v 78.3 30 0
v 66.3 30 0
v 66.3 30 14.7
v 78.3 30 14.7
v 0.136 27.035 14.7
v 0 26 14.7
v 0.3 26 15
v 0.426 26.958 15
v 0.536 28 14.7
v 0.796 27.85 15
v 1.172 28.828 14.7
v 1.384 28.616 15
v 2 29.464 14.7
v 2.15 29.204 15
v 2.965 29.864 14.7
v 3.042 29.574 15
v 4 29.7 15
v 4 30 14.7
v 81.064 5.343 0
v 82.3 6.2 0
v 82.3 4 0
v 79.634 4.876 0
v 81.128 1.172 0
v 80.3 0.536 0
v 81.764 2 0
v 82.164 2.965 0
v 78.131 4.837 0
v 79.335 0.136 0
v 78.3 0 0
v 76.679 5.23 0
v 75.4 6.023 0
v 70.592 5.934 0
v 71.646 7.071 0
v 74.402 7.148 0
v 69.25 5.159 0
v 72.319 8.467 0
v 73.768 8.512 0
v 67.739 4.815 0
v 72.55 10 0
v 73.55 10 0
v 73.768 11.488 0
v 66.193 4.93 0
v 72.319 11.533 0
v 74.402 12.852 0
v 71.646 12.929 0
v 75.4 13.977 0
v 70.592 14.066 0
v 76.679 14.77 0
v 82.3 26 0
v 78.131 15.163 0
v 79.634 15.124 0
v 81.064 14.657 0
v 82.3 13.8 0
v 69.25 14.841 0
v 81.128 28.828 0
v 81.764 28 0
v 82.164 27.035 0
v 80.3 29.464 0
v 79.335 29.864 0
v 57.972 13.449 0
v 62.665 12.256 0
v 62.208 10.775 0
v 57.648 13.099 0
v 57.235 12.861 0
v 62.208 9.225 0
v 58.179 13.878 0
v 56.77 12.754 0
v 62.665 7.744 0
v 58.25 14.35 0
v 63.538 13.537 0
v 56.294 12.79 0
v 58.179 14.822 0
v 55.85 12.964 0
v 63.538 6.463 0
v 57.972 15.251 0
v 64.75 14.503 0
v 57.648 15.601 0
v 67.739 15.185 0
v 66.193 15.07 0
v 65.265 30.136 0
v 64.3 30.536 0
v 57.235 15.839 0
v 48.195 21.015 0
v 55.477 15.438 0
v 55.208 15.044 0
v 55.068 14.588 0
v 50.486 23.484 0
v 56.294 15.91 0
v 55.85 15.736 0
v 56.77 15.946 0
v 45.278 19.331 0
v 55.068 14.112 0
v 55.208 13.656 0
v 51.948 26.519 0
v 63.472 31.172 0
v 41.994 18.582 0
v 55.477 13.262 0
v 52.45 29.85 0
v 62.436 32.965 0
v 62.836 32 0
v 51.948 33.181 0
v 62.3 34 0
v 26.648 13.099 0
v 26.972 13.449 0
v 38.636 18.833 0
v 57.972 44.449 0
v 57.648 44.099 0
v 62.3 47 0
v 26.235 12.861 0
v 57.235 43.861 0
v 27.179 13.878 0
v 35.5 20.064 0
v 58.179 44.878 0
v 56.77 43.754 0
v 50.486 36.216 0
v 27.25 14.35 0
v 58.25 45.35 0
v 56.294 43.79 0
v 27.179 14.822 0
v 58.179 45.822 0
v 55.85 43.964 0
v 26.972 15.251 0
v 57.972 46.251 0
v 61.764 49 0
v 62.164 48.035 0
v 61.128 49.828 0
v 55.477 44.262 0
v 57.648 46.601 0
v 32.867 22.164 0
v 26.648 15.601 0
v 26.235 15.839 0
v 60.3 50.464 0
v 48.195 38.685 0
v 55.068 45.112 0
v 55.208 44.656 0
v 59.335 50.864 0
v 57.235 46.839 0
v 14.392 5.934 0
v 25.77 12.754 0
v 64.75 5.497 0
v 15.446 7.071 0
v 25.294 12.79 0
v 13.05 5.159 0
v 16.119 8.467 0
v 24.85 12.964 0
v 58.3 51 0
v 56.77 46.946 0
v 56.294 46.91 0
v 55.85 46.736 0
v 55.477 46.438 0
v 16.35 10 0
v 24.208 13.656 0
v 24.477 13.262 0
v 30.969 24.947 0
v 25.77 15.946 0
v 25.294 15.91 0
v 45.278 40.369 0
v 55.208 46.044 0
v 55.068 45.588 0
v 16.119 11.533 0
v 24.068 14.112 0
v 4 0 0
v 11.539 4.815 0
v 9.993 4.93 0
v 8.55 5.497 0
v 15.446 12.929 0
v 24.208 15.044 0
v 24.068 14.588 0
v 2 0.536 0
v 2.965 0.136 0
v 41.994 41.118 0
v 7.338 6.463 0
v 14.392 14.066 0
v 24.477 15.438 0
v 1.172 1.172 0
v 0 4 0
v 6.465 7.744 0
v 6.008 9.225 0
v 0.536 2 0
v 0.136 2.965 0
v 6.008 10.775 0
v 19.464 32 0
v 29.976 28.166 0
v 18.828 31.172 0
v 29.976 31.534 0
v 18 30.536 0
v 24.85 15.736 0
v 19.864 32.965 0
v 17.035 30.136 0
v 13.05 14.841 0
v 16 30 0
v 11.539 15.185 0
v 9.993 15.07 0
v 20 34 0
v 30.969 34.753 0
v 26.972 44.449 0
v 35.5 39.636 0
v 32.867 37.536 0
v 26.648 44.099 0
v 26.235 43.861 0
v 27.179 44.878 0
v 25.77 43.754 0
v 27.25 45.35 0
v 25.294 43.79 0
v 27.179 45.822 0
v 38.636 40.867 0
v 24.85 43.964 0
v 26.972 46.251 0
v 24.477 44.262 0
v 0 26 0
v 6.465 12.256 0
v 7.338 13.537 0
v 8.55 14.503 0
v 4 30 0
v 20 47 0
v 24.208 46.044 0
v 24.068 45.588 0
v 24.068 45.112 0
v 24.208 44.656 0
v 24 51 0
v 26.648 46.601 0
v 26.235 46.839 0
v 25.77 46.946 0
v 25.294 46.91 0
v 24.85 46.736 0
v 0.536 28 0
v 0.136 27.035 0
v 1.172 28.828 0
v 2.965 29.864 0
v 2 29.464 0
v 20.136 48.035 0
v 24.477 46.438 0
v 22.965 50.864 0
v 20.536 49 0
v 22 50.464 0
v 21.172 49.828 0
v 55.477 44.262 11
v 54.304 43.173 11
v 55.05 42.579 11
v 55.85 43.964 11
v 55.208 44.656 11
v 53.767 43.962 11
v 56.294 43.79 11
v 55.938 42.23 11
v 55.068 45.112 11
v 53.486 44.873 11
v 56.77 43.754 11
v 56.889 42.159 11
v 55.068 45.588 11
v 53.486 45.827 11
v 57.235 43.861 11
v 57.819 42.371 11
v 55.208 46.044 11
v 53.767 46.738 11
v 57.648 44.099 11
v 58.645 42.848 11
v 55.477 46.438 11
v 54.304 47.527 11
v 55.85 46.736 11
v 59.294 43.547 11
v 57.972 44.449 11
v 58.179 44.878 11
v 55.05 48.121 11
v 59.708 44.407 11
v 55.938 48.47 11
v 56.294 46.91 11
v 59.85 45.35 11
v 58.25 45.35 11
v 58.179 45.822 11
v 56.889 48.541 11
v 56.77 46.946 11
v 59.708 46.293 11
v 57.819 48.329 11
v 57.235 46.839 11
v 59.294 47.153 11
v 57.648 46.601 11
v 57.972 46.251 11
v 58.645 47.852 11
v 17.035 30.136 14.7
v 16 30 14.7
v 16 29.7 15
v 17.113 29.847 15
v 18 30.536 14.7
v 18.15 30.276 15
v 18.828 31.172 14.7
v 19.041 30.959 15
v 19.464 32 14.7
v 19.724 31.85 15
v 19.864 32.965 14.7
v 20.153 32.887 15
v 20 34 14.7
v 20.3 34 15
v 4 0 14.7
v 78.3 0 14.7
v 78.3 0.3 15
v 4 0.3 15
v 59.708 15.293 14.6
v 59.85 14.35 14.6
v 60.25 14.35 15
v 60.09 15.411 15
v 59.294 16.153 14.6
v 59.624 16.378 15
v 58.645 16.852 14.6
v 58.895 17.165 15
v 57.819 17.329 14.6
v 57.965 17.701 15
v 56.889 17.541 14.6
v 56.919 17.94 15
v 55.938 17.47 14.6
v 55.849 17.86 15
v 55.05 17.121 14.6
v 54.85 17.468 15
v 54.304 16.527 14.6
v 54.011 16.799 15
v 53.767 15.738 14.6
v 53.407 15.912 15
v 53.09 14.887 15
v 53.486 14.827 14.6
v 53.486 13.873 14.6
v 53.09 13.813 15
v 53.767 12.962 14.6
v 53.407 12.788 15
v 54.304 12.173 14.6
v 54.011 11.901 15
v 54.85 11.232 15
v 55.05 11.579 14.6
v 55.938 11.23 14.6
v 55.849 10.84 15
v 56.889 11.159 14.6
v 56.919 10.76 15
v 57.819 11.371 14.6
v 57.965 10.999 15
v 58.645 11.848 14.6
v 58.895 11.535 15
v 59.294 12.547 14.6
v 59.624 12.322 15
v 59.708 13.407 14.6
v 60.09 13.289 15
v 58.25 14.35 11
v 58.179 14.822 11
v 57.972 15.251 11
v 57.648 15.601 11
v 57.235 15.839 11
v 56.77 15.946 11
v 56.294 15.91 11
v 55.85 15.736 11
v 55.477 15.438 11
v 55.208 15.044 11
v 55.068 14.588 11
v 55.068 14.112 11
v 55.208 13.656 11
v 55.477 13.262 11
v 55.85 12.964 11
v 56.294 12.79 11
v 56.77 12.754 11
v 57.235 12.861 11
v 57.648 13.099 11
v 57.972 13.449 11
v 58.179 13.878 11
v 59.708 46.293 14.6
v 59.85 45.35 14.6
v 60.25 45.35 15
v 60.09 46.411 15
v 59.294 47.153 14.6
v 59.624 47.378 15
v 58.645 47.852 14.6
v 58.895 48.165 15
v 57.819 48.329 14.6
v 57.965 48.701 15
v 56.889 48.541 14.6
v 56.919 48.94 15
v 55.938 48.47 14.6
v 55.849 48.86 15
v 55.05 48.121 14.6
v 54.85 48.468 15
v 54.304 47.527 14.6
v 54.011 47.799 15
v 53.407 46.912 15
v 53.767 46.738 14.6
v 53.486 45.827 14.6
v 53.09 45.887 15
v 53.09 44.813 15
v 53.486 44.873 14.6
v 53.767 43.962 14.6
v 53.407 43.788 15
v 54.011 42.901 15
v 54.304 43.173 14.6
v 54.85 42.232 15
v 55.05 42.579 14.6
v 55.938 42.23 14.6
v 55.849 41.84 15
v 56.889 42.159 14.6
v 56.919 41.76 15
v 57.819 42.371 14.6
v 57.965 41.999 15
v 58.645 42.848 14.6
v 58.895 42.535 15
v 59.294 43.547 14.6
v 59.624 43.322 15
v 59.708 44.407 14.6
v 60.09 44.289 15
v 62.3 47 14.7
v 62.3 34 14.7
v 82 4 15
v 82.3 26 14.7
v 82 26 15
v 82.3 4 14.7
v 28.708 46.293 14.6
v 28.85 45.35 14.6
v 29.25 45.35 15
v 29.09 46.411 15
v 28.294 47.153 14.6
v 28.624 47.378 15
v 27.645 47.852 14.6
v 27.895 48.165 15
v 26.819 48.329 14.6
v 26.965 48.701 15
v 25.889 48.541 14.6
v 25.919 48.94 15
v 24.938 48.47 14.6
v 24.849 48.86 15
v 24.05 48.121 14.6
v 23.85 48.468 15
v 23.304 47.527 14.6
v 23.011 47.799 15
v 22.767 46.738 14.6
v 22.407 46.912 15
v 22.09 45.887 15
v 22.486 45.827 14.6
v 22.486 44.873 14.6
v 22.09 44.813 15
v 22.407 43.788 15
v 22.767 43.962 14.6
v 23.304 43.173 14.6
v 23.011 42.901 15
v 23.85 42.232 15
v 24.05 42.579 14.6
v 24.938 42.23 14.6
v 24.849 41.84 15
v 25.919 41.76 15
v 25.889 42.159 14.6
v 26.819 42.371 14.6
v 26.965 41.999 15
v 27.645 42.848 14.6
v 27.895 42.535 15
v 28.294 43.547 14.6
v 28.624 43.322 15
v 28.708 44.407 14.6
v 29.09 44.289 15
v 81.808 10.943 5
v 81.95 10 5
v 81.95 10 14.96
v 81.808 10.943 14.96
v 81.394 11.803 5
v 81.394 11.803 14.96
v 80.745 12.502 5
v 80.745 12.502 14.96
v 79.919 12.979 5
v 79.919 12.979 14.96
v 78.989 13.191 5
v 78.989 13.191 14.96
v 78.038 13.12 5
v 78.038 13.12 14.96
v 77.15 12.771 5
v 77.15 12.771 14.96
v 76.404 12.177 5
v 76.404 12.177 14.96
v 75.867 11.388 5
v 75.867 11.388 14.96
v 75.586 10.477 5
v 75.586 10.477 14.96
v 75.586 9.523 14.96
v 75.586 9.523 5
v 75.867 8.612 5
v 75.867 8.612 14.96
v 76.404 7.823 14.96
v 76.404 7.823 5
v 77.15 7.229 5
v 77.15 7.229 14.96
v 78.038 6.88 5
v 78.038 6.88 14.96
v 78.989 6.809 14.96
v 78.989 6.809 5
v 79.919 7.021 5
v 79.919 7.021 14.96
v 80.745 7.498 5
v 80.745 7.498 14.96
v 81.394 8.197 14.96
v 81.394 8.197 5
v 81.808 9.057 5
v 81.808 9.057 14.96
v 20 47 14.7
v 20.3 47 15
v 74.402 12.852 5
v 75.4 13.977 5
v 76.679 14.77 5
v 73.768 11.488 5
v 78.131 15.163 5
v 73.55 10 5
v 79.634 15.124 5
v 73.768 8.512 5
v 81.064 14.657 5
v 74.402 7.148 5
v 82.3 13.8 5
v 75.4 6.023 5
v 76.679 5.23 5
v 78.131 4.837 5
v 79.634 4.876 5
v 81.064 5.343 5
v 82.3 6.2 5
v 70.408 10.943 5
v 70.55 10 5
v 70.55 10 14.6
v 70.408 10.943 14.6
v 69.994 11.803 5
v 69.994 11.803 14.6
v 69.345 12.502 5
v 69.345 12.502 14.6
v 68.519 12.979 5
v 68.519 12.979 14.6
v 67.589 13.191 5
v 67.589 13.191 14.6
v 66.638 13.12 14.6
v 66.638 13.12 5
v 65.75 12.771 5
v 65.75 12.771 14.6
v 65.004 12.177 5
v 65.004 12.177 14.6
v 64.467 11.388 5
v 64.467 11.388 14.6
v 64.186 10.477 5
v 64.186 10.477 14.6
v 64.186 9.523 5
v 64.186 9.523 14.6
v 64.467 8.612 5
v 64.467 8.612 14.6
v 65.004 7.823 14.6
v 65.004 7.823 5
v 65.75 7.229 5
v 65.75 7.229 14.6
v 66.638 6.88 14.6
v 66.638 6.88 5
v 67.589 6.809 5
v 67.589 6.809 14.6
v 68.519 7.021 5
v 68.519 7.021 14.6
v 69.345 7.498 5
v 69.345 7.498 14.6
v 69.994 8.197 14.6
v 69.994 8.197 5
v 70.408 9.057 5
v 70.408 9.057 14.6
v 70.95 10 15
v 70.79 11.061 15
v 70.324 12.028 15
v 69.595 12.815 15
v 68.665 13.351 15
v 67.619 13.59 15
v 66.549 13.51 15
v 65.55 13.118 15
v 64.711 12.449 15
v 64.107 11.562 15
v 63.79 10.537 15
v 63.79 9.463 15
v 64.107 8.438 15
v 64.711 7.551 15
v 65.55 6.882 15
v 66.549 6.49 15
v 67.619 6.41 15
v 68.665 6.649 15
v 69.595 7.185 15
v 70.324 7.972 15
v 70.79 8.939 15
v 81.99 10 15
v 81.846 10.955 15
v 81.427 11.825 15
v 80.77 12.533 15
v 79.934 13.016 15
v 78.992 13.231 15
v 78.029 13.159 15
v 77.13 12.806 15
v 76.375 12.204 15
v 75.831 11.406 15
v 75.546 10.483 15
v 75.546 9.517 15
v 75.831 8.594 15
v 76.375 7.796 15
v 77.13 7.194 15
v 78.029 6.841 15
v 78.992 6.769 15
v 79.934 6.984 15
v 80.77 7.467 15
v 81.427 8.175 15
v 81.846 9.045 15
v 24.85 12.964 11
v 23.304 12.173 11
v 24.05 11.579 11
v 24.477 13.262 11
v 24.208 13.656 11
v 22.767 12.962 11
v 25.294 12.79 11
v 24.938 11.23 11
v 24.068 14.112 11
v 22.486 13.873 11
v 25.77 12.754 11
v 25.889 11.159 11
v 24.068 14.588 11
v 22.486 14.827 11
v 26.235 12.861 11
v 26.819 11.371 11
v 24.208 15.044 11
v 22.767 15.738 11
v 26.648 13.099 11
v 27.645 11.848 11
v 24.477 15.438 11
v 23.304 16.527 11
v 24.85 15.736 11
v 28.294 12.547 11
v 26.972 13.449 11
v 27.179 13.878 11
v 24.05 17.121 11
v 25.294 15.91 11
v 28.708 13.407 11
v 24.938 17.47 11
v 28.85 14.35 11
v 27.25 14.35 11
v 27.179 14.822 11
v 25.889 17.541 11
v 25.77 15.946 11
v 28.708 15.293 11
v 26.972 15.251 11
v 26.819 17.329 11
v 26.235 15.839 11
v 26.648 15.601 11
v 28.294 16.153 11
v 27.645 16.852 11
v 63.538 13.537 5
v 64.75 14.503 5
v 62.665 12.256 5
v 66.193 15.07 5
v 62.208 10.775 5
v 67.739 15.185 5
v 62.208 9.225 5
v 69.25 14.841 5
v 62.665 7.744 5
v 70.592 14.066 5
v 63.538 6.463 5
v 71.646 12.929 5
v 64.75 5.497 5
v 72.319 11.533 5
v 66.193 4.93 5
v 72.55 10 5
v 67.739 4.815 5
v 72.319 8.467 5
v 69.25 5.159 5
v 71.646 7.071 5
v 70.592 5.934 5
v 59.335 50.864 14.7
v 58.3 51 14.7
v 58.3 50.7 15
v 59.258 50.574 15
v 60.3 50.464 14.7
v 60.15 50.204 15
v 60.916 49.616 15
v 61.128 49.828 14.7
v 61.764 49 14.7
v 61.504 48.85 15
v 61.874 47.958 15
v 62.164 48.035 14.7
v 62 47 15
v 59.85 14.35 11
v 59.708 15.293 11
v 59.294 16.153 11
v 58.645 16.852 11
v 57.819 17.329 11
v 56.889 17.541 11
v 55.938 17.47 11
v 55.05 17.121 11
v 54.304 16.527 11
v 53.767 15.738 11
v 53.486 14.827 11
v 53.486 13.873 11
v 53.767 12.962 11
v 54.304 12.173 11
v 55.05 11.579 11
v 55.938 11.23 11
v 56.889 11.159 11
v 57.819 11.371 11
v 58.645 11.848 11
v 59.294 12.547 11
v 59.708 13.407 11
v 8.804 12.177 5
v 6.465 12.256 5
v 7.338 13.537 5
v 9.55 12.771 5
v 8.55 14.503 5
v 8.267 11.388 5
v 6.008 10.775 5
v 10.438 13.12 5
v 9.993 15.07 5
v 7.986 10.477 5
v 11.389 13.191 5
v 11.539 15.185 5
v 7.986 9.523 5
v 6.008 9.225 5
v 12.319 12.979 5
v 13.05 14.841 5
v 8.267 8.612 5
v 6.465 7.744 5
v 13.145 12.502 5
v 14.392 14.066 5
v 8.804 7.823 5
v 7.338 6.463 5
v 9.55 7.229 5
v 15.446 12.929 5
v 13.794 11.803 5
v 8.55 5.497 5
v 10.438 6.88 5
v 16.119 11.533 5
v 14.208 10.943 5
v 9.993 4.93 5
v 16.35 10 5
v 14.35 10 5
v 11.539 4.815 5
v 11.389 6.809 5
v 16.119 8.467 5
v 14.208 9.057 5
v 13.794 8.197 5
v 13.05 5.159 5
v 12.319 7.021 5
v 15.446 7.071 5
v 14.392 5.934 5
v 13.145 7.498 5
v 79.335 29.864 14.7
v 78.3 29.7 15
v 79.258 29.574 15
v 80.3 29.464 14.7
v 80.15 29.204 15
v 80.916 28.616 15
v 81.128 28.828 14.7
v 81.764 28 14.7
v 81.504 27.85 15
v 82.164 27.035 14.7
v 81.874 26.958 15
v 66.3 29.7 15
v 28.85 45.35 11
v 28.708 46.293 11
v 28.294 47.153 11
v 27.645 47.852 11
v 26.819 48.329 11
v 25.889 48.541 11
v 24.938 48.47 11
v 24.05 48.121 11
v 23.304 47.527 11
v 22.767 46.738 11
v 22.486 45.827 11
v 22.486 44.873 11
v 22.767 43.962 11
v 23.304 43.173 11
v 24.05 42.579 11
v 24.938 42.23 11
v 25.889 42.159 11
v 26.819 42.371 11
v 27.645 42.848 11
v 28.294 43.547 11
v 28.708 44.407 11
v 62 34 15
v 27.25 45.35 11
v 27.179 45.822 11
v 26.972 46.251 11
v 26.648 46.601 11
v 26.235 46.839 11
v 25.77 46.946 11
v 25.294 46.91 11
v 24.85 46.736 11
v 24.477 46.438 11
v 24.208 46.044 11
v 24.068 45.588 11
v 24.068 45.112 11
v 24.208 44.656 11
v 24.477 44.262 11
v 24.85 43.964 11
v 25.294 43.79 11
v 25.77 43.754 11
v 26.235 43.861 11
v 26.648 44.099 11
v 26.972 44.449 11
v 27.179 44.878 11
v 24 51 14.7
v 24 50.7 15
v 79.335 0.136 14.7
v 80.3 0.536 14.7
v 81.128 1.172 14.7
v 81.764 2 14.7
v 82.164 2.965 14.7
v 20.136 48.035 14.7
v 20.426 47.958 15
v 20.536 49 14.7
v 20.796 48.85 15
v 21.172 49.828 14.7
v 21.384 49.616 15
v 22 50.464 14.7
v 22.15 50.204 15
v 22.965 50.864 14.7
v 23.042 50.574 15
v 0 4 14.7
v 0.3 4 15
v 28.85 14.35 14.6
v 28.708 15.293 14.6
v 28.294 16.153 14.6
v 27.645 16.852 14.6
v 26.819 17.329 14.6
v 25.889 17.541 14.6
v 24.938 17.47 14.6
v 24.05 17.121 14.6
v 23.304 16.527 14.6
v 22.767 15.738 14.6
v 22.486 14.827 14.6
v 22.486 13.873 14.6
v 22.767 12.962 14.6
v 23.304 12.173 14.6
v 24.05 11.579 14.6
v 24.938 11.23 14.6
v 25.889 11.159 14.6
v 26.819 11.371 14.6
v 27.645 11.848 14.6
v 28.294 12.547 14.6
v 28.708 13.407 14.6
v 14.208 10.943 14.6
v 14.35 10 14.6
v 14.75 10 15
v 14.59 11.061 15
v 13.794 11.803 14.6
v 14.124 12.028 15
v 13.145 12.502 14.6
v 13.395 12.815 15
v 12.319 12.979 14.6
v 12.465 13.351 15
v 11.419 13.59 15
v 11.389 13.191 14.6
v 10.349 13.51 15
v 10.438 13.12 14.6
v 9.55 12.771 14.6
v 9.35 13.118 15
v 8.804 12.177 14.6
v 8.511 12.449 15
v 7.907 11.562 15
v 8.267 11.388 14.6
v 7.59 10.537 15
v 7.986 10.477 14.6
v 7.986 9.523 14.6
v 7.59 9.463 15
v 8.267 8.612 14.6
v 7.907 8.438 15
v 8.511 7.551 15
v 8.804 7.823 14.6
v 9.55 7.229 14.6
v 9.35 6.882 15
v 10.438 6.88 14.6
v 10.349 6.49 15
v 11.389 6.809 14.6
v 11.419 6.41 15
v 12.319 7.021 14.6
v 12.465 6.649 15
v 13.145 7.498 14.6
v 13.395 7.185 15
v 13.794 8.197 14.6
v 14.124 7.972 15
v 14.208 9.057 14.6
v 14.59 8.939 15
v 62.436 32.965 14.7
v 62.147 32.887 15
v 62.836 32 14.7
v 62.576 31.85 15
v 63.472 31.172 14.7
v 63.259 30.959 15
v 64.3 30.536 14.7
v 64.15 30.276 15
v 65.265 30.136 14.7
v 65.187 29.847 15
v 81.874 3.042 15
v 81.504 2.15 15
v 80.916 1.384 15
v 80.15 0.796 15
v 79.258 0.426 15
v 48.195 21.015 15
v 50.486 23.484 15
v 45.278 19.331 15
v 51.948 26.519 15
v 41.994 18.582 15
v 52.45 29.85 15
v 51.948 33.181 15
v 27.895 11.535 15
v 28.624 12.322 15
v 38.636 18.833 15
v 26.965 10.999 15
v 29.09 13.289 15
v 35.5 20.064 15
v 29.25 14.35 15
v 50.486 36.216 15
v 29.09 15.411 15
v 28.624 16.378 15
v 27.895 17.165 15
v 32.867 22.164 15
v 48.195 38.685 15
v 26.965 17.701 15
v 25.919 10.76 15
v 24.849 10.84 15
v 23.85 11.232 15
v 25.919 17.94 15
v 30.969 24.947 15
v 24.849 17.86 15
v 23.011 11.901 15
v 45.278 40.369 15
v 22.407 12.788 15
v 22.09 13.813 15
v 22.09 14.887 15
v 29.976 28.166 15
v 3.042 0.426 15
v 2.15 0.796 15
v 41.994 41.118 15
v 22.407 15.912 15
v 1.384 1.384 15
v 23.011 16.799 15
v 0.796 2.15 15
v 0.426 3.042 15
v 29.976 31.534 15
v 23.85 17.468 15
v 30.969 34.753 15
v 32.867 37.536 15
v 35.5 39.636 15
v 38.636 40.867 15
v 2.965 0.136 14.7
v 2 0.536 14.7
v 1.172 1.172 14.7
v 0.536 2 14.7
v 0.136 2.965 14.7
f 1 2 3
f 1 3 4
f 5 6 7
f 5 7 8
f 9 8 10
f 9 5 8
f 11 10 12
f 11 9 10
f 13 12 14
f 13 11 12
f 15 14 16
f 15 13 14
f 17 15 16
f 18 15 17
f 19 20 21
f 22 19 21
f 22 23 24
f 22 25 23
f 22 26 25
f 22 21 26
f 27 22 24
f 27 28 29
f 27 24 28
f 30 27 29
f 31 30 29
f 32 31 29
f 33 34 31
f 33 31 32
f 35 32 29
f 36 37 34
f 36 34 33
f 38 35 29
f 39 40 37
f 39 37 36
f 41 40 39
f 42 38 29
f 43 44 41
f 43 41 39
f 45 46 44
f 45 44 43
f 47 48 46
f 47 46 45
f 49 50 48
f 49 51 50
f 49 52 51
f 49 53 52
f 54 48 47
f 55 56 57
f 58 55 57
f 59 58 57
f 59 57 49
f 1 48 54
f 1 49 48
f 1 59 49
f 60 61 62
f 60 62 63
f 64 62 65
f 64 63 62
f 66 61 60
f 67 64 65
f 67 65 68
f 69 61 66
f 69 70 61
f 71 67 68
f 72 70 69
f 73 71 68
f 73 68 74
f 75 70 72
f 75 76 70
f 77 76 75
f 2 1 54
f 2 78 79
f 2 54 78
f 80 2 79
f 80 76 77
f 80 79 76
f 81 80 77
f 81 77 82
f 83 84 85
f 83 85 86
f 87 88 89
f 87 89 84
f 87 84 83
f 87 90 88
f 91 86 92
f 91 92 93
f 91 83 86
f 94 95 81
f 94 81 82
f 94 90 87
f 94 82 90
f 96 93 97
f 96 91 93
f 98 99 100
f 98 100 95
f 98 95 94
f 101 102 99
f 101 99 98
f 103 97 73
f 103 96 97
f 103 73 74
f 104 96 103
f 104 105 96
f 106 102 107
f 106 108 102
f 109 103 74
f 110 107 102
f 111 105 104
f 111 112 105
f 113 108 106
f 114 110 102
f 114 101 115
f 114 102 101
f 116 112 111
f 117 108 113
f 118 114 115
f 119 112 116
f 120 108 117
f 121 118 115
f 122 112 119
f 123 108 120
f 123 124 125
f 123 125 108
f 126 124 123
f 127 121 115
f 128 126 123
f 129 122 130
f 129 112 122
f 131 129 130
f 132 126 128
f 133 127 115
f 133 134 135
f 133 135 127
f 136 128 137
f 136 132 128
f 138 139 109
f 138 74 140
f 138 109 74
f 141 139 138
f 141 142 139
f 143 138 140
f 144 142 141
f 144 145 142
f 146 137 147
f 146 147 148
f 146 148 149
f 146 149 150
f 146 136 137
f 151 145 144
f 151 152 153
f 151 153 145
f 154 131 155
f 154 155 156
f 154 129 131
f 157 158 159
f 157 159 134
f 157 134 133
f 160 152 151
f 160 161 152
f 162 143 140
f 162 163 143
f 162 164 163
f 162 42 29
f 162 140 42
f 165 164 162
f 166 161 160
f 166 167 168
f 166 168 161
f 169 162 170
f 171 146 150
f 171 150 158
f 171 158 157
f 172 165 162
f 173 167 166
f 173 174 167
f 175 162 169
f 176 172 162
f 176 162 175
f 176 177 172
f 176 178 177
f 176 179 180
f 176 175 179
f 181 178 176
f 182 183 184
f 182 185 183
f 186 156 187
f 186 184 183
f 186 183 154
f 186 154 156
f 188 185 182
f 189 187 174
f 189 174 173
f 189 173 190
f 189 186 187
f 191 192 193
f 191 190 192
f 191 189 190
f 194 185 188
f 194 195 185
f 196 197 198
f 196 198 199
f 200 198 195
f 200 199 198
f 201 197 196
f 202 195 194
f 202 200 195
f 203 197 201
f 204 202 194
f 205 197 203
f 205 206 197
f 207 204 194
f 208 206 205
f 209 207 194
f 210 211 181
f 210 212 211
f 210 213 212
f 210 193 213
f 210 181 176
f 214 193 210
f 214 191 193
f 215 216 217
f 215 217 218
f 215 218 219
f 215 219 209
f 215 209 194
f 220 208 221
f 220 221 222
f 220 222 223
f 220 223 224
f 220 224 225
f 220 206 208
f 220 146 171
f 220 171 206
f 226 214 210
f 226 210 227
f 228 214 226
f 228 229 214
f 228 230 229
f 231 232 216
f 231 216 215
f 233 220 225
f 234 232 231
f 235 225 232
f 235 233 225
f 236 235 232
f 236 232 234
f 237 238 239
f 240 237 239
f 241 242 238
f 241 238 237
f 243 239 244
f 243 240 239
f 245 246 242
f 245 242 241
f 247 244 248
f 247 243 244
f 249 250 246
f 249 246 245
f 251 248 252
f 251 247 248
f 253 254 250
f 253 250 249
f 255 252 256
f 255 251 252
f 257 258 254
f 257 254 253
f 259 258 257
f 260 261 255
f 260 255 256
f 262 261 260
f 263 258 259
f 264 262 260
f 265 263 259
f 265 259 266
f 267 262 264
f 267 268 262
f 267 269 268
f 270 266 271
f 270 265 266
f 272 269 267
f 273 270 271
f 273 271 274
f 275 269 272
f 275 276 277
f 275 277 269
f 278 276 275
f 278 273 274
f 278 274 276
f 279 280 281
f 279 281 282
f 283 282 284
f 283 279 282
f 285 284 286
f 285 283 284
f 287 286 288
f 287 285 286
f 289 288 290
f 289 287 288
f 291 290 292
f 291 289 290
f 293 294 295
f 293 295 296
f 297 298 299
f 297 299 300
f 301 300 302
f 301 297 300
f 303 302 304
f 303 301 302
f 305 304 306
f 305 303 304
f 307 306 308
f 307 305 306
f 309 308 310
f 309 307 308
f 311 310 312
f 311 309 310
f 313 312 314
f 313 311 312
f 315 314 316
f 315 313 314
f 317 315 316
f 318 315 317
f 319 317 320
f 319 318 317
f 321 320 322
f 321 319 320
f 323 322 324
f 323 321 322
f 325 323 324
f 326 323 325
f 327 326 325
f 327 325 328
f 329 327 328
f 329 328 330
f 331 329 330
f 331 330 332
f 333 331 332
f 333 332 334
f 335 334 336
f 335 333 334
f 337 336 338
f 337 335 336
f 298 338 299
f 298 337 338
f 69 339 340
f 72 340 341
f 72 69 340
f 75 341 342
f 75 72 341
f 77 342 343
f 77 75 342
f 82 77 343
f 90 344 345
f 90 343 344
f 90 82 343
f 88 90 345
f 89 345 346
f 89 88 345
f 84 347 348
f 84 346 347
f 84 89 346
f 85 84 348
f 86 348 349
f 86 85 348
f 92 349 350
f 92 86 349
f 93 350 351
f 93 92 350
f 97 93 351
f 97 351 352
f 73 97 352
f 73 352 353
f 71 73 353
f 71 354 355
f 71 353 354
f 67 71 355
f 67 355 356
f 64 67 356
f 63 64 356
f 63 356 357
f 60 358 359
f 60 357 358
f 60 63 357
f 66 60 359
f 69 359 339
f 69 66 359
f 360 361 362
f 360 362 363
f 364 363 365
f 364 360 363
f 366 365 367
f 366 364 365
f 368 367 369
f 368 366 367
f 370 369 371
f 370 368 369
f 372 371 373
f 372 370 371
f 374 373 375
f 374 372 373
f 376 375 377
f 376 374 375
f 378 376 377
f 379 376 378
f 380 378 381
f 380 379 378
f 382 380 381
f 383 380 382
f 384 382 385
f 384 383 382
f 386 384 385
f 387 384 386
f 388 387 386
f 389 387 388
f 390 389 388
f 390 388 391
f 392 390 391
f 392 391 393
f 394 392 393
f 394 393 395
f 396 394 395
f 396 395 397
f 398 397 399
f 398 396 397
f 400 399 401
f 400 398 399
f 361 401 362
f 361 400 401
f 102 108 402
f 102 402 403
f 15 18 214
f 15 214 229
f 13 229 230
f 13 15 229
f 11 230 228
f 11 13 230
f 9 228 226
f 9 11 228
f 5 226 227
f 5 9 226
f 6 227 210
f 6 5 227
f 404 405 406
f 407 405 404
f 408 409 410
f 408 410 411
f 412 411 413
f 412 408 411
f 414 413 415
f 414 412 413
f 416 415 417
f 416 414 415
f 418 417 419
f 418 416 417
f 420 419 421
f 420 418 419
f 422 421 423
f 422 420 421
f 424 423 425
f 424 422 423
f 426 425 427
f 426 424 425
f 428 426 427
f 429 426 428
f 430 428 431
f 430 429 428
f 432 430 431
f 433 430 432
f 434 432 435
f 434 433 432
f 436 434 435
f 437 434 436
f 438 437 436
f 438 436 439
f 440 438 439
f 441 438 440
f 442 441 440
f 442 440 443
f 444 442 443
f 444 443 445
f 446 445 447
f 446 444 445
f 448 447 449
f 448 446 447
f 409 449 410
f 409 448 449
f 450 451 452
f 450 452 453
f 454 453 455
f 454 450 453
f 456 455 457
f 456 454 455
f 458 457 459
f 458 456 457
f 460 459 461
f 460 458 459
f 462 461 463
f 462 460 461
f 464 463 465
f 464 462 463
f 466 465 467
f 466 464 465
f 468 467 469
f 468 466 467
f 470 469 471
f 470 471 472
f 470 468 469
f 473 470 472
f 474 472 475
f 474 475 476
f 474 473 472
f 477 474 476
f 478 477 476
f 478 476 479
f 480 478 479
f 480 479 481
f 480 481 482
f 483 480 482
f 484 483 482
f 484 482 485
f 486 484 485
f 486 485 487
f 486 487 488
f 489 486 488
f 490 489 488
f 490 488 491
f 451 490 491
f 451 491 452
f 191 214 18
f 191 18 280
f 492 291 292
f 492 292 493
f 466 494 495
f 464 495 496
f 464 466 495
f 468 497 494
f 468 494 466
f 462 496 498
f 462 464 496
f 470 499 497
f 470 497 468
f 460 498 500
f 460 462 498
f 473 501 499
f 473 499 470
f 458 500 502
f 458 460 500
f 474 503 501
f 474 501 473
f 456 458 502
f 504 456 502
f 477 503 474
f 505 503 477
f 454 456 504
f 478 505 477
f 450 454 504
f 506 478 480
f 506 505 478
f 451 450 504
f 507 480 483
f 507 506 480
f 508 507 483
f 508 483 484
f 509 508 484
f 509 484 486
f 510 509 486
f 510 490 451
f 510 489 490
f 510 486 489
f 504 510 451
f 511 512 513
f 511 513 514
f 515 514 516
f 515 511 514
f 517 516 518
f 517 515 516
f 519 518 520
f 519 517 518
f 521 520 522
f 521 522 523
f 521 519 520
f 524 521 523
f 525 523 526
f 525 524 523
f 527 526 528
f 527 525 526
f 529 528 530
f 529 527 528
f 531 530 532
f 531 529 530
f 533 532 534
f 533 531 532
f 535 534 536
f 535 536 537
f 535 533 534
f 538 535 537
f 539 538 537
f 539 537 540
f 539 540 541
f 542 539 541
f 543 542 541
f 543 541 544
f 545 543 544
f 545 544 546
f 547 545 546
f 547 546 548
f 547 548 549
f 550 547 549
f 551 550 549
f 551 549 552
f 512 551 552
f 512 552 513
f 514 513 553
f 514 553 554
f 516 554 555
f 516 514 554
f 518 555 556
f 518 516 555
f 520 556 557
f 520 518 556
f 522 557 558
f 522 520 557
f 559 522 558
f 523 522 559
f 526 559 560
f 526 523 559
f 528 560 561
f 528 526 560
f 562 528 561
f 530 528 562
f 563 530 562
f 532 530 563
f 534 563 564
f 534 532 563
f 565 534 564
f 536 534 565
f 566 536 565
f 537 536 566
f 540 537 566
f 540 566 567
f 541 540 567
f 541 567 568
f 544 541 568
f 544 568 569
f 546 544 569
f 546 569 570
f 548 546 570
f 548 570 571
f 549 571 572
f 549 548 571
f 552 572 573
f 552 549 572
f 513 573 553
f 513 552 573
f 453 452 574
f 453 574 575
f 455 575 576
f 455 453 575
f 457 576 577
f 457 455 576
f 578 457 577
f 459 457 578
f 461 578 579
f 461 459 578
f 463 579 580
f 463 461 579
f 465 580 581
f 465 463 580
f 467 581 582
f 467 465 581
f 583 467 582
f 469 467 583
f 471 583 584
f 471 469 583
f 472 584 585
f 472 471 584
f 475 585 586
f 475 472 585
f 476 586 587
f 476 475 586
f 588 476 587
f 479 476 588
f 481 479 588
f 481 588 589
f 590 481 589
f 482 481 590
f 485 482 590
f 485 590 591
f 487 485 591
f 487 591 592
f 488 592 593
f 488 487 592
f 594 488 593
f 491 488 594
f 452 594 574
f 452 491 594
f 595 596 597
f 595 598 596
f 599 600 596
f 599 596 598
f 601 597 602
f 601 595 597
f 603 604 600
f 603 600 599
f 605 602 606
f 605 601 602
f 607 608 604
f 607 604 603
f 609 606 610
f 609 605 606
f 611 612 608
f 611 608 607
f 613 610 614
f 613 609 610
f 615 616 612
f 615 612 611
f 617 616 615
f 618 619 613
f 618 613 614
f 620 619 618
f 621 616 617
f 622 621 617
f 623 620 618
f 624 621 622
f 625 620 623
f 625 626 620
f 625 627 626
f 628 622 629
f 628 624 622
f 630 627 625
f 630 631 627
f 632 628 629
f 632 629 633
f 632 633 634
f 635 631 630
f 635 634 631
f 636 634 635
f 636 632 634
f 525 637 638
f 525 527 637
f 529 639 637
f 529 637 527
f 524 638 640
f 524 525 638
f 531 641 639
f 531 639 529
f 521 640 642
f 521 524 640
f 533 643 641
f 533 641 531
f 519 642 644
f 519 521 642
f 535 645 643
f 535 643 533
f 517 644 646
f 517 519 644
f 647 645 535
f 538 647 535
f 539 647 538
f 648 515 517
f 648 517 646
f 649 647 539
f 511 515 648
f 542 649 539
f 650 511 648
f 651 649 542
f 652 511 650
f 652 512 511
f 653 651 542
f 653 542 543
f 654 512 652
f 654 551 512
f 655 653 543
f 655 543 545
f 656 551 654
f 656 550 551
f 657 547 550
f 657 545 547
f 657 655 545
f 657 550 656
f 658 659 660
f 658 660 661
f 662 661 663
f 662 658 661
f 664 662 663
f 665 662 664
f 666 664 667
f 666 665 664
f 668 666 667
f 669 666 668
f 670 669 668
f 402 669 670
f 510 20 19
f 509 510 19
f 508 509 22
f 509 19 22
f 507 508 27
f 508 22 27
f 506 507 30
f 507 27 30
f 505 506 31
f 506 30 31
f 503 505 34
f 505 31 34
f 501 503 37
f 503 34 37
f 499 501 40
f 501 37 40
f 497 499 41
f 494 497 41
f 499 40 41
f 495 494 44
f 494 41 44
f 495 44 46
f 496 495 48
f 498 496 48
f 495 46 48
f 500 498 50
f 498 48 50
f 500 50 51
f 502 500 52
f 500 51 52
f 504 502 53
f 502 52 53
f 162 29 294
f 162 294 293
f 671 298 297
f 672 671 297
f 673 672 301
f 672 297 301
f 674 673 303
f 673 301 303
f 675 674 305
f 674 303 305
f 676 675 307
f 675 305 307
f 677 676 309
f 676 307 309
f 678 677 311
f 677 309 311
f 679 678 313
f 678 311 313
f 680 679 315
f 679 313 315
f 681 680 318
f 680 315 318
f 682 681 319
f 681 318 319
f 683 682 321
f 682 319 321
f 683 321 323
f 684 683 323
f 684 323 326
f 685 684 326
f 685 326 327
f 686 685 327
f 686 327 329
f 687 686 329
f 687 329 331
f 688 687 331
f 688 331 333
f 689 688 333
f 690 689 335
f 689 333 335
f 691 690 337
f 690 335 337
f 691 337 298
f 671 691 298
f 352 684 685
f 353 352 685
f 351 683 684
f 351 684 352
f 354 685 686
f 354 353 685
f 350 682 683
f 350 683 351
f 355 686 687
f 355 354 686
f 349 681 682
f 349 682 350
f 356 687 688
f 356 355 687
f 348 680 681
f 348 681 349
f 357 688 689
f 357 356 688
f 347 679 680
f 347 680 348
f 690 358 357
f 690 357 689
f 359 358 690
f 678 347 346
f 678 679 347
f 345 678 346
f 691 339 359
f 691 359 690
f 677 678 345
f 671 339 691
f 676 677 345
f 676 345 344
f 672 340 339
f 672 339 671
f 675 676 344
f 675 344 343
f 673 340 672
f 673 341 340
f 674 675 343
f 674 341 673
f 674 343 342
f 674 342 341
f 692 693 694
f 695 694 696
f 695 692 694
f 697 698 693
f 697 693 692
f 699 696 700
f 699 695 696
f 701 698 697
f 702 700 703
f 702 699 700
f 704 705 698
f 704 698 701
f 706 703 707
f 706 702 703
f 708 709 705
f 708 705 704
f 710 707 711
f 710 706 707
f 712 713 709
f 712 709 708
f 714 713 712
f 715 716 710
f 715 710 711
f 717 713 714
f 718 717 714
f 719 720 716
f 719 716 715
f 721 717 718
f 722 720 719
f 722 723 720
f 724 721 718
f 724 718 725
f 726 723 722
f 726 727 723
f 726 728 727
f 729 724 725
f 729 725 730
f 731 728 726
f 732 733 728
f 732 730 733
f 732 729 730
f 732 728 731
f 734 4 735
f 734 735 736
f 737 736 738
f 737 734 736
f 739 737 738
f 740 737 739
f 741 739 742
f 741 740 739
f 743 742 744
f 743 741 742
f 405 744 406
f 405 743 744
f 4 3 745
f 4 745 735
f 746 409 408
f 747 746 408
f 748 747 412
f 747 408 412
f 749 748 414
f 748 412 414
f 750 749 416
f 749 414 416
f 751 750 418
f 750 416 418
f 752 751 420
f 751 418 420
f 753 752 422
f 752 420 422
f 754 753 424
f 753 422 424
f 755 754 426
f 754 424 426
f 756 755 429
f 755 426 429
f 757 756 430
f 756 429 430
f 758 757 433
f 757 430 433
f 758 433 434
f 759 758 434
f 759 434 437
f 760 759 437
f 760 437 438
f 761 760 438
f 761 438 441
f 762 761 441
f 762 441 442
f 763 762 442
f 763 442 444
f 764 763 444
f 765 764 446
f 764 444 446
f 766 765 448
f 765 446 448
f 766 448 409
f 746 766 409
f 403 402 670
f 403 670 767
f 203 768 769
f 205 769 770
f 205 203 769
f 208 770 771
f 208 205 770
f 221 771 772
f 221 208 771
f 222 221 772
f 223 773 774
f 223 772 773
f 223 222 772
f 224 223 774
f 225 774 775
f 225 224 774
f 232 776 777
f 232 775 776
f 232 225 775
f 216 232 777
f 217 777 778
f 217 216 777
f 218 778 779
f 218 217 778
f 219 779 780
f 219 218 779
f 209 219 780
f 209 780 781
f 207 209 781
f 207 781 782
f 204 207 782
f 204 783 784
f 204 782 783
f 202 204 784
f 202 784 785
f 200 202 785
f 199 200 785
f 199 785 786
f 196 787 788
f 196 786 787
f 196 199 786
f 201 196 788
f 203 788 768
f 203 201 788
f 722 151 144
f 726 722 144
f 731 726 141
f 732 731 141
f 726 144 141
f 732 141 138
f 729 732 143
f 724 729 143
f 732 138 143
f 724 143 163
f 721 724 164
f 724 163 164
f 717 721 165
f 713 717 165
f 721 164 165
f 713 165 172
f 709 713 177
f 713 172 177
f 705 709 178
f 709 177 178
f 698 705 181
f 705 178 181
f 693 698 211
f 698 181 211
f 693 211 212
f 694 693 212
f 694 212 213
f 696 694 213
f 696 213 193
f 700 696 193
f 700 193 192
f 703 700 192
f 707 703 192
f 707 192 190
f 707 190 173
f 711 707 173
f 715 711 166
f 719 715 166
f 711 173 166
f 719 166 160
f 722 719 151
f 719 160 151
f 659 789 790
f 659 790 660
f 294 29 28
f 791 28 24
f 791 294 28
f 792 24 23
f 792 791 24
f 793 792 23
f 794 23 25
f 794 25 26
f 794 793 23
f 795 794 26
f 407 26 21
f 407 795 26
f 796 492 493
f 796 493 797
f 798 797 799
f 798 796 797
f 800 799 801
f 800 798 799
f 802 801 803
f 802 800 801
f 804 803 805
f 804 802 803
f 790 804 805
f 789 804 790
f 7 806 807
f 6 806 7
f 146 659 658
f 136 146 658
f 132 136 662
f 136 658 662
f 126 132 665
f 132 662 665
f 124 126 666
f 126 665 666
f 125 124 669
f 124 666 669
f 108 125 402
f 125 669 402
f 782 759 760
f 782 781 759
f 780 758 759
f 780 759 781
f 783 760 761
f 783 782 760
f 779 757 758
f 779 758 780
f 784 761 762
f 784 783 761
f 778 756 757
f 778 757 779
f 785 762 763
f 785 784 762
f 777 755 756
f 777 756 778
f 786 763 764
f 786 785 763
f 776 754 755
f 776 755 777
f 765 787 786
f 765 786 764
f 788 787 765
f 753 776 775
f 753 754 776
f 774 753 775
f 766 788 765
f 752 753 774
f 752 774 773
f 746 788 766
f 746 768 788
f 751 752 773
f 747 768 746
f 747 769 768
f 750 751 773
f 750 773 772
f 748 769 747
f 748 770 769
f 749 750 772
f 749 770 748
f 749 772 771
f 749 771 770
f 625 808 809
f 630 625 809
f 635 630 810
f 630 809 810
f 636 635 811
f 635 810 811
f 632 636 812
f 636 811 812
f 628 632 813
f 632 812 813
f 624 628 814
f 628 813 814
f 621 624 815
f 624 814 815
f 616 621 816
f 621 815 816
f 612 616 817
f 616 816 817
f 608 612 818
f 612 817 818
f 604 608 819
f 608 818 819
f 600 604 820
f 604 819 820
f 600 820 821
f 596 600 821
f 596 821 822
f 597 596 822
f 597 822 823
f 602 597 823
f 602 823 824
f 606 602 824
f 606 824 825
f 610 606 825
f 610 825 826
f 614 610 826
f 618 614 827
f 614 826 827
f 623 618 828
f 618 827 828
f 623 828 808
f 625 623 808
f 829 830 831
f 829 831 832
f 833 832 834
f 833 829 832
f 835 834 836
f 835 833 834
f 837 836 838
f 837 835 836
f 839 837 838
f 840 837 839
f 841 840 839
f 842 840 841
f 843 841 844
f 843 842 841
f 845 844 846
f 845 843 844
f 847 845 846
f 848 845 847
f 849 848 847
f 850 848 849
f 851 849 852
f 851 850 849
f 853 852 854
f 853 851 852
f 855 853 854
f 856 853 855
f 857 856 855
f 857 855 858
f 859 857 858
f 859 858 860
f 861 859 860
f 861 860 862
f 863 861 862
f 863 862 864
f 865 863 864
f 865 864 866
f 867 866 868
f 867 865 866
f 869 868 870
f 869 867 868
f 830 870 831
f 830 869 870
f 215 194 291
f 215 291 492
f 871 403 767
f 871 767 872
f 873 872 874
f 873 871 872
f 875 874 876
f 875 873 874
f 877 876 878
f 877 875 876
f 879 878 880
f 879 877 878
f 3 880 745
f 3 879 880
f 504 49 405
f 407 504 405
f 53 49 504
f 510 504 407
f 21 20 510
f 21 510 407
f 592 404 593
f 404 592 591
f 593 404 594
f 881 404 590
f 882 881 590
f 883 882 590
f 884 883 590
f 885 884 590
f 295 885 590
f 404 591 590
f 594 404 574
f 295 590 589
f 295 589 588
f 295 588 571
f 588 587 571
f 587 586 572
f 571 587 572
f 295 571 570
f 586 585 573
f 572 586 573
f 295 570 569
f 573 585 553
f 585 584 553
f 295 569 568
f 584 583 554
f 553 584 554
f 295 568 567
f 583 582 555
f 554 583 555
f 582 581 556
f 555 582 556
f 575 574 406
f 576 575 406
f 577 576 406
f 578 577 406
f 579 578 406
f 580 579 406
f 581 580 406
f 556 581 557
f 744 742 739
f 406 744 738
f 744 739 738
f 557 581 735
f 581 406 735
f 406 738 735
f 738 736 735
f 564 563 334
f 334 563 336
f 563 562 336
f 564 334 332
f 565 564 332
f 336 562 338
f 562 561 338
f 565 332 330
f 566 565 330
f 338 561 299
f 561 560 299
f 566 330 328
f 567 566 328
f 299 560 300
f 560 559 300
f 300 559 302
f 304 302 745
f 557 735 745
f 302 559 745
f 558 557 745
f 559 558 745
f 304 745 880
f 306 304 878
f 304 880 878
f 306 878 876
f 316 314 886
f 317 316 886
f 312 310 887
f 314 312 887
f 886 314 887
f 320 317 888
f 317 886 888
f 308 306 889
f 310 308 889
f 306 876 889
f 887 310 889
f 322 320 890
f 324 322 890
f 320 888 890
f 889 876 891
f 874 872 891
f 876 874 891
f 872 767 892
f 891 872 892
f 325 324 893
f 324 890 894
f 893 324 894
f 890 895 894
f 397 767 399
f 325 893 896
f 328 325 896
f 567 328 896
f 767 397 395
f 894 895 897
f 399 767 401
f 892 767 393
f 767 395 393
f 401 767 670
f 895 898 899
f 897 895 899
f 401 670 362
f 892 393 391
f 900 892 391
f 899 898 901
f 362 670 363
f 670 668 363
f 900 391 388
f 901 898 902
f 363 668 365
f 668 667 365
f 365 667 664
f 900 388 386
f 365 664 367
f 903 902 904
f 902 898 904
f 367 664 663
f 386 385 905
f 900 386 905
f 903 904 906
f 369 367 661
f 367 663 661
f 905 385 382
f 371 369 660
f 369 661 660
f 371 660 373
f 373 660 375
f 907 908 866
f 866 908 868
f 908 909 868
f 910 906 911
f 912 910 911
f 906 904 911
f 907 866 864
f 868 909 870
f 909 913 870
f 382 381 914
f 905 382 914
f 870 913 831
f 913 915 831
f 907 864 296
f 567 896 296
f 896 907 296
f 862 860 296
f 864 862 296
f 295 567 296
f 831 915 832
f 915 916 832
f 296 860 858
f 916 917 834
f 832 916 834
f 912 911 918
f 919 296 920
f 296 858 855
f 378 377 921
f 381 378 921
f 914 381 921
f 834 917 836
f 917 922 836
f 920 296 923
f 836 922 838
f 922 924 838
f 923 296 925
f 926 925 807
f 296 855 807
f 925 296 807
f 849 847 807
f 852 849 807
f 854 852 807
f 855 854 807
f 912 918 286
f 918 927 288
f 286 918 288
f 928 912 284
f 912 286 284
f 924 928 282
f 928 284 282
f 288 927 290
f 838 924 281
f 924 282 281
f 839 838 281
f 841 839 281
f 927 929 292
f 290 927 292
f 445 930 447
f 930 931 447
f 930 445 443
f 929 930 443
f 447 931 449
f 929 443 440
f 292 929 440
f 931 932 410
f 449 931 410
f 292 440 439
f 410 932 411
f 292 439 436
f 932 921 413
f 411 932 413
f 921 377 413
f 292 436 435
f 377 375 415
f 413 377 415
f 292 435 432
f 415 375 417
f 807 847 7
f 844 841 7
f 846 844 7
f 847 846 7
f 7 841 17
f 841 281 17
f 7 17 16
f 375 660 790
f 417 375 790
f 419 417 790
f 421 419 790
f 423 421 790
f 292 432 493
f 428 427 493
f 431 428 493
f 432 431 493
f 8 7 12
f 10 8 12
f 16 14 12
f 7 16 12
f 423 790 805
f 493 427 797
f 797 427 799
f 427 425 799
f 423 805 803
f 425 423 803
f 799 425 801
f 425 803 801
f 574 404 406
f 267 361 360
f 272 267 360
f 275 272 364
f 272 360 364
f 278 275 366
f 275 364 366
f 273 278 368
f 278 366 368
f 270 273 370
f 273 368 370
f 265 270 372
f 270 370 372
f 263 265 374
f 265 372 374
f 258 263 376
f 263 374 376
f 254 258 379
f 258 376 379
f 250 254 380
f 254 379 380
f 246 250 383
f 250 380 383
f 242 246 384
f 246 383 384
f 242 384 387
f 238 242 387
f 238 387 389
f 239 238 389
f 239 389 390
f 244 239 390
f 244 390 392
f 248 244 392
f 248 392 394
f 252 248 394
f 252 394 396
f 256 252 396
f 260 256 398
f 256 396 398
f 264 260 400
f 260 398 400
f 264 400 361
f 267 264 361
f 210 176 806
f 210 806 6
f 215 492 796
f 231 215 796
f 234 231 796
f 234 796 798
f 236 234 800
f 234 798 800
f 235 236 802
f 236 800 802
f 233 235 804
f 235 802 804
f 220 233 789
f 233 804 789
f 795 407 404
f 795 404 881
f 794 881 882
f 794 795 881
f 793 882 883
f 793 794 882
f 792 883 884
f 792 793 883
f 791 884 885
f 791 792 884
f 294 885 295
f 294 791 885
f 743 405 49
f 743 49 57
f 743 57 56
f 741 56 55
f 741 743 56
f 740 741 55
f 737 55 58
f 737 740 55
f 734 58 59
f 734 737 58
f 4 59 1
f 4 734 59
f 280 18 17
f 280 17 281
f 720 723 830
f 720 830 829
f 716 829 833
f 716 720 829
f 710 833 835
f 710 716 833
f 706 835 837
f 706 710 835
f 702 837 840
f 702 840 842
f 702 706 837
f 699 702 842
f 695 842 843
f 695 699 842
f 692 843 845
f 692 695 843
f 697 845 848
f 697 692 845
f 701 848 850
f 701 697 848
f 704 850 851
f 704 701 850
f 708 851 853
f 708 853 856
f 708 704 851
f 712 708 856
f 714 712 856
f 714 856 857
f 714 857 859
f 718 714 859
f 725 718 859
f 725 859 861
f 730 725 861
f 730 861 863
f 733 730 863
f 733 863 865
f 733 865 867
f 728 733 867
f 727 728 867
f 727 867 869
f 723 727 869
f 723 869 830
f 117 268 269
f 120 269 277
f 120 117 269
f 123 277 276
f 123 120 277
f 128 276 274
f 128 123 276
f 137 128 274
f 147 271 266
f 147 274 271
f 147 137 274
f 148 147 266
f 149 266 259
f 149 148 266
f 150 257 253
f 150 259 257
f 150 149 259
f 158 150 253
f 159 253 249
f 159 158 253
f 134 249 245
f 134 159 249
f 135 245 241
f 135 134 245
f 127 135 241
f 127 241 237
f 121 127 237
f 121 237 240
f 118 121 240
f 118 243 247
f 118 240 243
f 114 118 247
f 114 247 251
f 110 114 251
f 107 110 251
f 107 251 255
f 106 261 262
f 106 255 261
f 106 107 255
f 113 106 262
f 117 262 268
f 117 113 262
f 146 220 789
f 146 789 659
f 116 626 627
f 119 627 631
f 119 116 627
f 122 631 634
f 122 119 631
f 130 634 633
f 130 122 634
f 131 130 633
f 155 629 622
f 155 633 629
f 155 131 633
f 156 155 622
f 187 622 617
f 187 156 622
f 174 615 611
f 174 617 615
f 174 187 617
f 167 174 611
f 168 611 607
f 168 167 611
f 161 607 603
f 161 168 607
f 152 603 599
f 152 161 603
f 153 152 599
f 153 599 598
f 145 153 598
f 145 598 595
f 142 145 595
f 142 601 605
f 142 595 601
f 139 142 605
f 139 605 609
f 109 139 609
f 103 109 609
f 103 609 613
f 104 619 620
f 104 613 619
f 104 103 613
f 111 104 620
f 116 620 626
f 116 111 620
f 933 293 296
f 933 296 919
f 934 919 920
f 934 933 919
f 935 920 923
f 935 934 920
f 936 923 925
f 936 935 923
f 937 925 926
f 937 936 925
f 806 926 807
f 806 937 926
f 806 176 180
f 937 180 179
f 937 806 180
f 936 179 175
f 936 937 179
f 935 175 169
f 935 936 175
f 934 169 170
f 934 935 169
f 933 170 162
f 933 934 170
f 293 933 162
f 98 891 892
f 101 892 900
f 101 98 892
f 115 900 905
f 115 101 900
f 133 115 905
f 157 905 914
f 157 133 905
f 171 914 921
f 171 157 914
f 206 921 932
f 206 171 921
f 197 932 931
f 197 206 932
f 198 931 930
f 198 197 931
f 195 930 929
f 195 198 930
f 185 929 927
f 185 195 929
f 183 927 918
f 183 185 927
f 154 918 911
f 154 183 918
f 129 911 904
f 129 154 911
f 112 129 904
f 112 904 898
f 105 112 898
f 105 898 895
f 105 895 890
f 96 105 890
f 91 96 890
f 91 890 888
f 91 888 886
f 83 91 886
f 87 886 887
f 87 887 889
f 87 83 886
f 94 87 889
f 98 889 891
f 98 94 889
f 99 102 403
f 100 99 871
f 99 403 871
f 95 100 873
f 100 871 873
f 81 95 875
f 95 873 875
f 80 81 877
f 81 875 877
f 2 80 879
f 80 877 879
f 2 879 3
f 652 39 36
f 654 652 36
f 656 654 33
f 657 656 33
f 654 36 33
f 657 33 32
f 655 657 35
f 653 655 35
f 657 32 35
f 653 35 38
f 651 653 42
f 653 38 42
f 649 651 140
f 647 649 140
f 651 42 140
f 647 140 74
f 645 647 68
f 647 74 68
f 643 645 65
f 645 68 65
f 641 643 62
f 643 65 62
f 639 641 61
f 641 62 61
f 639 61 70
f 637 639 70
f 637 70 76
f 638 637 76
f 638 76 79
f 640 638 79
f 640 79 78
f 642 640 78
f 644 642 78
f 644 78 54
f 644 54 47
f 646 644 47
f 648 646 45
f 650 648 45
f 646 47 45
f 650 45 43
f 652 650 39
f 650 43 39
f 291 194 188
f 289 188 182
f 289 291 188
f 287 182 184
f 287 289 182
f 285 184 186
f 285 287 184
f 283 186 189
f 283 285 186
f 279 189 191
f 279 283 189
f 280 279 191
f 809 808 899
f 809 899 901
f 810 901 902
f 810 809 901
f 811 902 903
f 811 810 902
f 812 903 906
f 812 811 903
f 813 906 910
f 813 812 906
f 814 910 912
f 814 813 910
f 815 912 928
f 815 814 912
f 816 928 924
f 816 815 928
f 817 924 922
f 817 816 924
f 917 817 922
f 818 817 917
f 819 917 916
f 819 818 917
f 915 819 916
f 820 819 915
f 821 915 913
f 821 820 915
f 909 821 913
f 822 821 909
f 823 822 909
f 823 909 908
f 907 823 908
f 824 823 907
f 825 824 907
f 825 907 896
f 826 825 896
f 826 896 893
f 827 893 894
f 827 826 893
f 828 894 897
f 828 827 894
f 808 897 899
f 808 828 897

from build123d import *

# Parameters (mm, degrees)
SKETCH_R        = 11.3
SKETCH_R_2      = 1.6
SKETCH_R_3      = 3.2
PAD_DEPTH       = 15
SKETCH001_R     = 3.2
POCKET_DEPTH    = 4
SKETCH002_R     = 5.2
POCKET001_DEPTH = 5
FILLET_R        = 4
CHAMFER_SIZE    = 0.3
CHAMFER001_SIZE = 0.4
CHAMFER002_SIZE = 0.04


with BuildPart() as part:
    # Sketch → Pad (new body)
    with BuildSketch(Plane.XY):
        Polygon((20, 30), (20, 51), (62.3, 51), (62.3, 30), (82.3, 30), (82.3, 0), (0, 0), (0, 30), align=None)
        with Locations((41.15, 29.85)):
            Circle(SKETCH_R, mode=Mode.SUBTRACT)
        with Locations((25.65, 45.35)):
            Circle(SKETCH_R_2, mode=Mode.SUBTRACT)
        with Locations((25.65, 14.35)):
            Circle(SKETCH_R_2, mode=Mode.SUBTRACT)
        with Locations((56.65, 45.35)):
            Circle(SKETCH_R_2, mode=Mode.SUBTRACT)
        with Locations((56.65, 14.35)):
            Circle(SKETCH_R_2, mode=Mode.SUBTRACT)
        with Locations((11.15, 10)):
            Circle(SKETCH_R_3, mode=Mode.SUBTRACT)
        with Locations((67.35, 10)):
            Circle(SKETCH_R_3, mode=Mode.SUBTRACT)
        with Locations((78.75, 10)):
            Circle(SKETCH_R_3, mode=Mode.SUBTRACT)
    extrude(amount=PAD_DEPTH)

    # Sketch001 (on Face18 of Pad) → Pocket (cut)
    with BuildSketch(Plane.XY.offset(15)):
        with Locations((25.65, 45.35)):
            Circle(SKETCH001_R)
        with Locations((56.65, 45.35)):
            Circle(SKETCH001_R)
        with Locations((56.65, 14.35)):
            Circle(SKETCH001_R)
        with Locations((25.65, 14.35)):
            Circle(SKETCH001_R)
    extrude(amount=-POCKET_DEPTH, mode=Mode.SUBTRACT)

    # Sketch002 (on Face4 of Pocket) → Pocket001 (cut)
    with BuildSketch(Plane(origin=(0, 0, 0), x_dir=(1, 0, 0), z_dir=(0, 0, -1))):
        with Locations((11.15, -10)):
            Circle(SKETCH002_R)
        with Locations((67.35, -10)):
            Circle(SKETCH002_R)
        with Locations((78.75, -10)):
            Circle(SKETCH002_R)
    extrude(amount=-POCKET001_DEPTH, mode=Mode.SUBTRACT)

    # Fillet
    fillet_edges = [part.edges().sort_by_distance(p)[0] for p in [
        (82.3, 0, 7.5),
        (0, 0, 7.5),
        (0, 30, 7.5),
        (20, 30, 7.5),
        (20, 51, 7.5),
        (62.3, 51, 7.5),
        (62.3, 30, 7.5),
        (82.3, 30, 7.5),
    ]]
    fillet(fillet_edges, radius=FILLET_R)

    # Chamfer
    chamfer_edges = [part.edges().sort_by_distance(p)[0] for p in [
        (82.3, 15, 15),
        (81.128427, 1.171573, 15),
        (41.15, 0, 15),
        (1.171573, 1.171573, 15),
        (0, 15, 15),
        (1.171573, 28.828427, 15),
        (10, 30, 15),
        (18.828427, 31.171573, 15),
        (20, 40.5, 15),
        (21.171573, 49.828427, 15),
        (41.15, 51, 15),
        (61.128427, 49.828427, 15),
        (62.3, 40.5, 15),
        (63.471573, 31.171573, 15),
        (72.3, 30, 15),
        (81.128427, 28.828427, 15),
    ]]
    chamfer(chamfer_edges, length=CHAMFER_SIZE)

    # Chamfer001
    chamfer001_edges = [part.edges().sort_by_distance(p)[0] for p in [
        (64.15, 10, 15),
        (53.45, 14.35, 15),
        (22.45, 14.35, 15),
        (7.95, 10, 15),
        (22.45, 45.35, 15),
        (53.45, 45.35, 15),
    ]]
    chamfer(chamfer001_edges, length=CHAMFER001_SIZE)

    # Chamfer002
    chamfer002_edges = [part.edges().sort_by_distance(p)[0] for p in [
        (75.55, 10, 15),
    ]]
    chamfer(chamfer002_edges, length=CHAMFER002_SIZE)


solid = part.part
